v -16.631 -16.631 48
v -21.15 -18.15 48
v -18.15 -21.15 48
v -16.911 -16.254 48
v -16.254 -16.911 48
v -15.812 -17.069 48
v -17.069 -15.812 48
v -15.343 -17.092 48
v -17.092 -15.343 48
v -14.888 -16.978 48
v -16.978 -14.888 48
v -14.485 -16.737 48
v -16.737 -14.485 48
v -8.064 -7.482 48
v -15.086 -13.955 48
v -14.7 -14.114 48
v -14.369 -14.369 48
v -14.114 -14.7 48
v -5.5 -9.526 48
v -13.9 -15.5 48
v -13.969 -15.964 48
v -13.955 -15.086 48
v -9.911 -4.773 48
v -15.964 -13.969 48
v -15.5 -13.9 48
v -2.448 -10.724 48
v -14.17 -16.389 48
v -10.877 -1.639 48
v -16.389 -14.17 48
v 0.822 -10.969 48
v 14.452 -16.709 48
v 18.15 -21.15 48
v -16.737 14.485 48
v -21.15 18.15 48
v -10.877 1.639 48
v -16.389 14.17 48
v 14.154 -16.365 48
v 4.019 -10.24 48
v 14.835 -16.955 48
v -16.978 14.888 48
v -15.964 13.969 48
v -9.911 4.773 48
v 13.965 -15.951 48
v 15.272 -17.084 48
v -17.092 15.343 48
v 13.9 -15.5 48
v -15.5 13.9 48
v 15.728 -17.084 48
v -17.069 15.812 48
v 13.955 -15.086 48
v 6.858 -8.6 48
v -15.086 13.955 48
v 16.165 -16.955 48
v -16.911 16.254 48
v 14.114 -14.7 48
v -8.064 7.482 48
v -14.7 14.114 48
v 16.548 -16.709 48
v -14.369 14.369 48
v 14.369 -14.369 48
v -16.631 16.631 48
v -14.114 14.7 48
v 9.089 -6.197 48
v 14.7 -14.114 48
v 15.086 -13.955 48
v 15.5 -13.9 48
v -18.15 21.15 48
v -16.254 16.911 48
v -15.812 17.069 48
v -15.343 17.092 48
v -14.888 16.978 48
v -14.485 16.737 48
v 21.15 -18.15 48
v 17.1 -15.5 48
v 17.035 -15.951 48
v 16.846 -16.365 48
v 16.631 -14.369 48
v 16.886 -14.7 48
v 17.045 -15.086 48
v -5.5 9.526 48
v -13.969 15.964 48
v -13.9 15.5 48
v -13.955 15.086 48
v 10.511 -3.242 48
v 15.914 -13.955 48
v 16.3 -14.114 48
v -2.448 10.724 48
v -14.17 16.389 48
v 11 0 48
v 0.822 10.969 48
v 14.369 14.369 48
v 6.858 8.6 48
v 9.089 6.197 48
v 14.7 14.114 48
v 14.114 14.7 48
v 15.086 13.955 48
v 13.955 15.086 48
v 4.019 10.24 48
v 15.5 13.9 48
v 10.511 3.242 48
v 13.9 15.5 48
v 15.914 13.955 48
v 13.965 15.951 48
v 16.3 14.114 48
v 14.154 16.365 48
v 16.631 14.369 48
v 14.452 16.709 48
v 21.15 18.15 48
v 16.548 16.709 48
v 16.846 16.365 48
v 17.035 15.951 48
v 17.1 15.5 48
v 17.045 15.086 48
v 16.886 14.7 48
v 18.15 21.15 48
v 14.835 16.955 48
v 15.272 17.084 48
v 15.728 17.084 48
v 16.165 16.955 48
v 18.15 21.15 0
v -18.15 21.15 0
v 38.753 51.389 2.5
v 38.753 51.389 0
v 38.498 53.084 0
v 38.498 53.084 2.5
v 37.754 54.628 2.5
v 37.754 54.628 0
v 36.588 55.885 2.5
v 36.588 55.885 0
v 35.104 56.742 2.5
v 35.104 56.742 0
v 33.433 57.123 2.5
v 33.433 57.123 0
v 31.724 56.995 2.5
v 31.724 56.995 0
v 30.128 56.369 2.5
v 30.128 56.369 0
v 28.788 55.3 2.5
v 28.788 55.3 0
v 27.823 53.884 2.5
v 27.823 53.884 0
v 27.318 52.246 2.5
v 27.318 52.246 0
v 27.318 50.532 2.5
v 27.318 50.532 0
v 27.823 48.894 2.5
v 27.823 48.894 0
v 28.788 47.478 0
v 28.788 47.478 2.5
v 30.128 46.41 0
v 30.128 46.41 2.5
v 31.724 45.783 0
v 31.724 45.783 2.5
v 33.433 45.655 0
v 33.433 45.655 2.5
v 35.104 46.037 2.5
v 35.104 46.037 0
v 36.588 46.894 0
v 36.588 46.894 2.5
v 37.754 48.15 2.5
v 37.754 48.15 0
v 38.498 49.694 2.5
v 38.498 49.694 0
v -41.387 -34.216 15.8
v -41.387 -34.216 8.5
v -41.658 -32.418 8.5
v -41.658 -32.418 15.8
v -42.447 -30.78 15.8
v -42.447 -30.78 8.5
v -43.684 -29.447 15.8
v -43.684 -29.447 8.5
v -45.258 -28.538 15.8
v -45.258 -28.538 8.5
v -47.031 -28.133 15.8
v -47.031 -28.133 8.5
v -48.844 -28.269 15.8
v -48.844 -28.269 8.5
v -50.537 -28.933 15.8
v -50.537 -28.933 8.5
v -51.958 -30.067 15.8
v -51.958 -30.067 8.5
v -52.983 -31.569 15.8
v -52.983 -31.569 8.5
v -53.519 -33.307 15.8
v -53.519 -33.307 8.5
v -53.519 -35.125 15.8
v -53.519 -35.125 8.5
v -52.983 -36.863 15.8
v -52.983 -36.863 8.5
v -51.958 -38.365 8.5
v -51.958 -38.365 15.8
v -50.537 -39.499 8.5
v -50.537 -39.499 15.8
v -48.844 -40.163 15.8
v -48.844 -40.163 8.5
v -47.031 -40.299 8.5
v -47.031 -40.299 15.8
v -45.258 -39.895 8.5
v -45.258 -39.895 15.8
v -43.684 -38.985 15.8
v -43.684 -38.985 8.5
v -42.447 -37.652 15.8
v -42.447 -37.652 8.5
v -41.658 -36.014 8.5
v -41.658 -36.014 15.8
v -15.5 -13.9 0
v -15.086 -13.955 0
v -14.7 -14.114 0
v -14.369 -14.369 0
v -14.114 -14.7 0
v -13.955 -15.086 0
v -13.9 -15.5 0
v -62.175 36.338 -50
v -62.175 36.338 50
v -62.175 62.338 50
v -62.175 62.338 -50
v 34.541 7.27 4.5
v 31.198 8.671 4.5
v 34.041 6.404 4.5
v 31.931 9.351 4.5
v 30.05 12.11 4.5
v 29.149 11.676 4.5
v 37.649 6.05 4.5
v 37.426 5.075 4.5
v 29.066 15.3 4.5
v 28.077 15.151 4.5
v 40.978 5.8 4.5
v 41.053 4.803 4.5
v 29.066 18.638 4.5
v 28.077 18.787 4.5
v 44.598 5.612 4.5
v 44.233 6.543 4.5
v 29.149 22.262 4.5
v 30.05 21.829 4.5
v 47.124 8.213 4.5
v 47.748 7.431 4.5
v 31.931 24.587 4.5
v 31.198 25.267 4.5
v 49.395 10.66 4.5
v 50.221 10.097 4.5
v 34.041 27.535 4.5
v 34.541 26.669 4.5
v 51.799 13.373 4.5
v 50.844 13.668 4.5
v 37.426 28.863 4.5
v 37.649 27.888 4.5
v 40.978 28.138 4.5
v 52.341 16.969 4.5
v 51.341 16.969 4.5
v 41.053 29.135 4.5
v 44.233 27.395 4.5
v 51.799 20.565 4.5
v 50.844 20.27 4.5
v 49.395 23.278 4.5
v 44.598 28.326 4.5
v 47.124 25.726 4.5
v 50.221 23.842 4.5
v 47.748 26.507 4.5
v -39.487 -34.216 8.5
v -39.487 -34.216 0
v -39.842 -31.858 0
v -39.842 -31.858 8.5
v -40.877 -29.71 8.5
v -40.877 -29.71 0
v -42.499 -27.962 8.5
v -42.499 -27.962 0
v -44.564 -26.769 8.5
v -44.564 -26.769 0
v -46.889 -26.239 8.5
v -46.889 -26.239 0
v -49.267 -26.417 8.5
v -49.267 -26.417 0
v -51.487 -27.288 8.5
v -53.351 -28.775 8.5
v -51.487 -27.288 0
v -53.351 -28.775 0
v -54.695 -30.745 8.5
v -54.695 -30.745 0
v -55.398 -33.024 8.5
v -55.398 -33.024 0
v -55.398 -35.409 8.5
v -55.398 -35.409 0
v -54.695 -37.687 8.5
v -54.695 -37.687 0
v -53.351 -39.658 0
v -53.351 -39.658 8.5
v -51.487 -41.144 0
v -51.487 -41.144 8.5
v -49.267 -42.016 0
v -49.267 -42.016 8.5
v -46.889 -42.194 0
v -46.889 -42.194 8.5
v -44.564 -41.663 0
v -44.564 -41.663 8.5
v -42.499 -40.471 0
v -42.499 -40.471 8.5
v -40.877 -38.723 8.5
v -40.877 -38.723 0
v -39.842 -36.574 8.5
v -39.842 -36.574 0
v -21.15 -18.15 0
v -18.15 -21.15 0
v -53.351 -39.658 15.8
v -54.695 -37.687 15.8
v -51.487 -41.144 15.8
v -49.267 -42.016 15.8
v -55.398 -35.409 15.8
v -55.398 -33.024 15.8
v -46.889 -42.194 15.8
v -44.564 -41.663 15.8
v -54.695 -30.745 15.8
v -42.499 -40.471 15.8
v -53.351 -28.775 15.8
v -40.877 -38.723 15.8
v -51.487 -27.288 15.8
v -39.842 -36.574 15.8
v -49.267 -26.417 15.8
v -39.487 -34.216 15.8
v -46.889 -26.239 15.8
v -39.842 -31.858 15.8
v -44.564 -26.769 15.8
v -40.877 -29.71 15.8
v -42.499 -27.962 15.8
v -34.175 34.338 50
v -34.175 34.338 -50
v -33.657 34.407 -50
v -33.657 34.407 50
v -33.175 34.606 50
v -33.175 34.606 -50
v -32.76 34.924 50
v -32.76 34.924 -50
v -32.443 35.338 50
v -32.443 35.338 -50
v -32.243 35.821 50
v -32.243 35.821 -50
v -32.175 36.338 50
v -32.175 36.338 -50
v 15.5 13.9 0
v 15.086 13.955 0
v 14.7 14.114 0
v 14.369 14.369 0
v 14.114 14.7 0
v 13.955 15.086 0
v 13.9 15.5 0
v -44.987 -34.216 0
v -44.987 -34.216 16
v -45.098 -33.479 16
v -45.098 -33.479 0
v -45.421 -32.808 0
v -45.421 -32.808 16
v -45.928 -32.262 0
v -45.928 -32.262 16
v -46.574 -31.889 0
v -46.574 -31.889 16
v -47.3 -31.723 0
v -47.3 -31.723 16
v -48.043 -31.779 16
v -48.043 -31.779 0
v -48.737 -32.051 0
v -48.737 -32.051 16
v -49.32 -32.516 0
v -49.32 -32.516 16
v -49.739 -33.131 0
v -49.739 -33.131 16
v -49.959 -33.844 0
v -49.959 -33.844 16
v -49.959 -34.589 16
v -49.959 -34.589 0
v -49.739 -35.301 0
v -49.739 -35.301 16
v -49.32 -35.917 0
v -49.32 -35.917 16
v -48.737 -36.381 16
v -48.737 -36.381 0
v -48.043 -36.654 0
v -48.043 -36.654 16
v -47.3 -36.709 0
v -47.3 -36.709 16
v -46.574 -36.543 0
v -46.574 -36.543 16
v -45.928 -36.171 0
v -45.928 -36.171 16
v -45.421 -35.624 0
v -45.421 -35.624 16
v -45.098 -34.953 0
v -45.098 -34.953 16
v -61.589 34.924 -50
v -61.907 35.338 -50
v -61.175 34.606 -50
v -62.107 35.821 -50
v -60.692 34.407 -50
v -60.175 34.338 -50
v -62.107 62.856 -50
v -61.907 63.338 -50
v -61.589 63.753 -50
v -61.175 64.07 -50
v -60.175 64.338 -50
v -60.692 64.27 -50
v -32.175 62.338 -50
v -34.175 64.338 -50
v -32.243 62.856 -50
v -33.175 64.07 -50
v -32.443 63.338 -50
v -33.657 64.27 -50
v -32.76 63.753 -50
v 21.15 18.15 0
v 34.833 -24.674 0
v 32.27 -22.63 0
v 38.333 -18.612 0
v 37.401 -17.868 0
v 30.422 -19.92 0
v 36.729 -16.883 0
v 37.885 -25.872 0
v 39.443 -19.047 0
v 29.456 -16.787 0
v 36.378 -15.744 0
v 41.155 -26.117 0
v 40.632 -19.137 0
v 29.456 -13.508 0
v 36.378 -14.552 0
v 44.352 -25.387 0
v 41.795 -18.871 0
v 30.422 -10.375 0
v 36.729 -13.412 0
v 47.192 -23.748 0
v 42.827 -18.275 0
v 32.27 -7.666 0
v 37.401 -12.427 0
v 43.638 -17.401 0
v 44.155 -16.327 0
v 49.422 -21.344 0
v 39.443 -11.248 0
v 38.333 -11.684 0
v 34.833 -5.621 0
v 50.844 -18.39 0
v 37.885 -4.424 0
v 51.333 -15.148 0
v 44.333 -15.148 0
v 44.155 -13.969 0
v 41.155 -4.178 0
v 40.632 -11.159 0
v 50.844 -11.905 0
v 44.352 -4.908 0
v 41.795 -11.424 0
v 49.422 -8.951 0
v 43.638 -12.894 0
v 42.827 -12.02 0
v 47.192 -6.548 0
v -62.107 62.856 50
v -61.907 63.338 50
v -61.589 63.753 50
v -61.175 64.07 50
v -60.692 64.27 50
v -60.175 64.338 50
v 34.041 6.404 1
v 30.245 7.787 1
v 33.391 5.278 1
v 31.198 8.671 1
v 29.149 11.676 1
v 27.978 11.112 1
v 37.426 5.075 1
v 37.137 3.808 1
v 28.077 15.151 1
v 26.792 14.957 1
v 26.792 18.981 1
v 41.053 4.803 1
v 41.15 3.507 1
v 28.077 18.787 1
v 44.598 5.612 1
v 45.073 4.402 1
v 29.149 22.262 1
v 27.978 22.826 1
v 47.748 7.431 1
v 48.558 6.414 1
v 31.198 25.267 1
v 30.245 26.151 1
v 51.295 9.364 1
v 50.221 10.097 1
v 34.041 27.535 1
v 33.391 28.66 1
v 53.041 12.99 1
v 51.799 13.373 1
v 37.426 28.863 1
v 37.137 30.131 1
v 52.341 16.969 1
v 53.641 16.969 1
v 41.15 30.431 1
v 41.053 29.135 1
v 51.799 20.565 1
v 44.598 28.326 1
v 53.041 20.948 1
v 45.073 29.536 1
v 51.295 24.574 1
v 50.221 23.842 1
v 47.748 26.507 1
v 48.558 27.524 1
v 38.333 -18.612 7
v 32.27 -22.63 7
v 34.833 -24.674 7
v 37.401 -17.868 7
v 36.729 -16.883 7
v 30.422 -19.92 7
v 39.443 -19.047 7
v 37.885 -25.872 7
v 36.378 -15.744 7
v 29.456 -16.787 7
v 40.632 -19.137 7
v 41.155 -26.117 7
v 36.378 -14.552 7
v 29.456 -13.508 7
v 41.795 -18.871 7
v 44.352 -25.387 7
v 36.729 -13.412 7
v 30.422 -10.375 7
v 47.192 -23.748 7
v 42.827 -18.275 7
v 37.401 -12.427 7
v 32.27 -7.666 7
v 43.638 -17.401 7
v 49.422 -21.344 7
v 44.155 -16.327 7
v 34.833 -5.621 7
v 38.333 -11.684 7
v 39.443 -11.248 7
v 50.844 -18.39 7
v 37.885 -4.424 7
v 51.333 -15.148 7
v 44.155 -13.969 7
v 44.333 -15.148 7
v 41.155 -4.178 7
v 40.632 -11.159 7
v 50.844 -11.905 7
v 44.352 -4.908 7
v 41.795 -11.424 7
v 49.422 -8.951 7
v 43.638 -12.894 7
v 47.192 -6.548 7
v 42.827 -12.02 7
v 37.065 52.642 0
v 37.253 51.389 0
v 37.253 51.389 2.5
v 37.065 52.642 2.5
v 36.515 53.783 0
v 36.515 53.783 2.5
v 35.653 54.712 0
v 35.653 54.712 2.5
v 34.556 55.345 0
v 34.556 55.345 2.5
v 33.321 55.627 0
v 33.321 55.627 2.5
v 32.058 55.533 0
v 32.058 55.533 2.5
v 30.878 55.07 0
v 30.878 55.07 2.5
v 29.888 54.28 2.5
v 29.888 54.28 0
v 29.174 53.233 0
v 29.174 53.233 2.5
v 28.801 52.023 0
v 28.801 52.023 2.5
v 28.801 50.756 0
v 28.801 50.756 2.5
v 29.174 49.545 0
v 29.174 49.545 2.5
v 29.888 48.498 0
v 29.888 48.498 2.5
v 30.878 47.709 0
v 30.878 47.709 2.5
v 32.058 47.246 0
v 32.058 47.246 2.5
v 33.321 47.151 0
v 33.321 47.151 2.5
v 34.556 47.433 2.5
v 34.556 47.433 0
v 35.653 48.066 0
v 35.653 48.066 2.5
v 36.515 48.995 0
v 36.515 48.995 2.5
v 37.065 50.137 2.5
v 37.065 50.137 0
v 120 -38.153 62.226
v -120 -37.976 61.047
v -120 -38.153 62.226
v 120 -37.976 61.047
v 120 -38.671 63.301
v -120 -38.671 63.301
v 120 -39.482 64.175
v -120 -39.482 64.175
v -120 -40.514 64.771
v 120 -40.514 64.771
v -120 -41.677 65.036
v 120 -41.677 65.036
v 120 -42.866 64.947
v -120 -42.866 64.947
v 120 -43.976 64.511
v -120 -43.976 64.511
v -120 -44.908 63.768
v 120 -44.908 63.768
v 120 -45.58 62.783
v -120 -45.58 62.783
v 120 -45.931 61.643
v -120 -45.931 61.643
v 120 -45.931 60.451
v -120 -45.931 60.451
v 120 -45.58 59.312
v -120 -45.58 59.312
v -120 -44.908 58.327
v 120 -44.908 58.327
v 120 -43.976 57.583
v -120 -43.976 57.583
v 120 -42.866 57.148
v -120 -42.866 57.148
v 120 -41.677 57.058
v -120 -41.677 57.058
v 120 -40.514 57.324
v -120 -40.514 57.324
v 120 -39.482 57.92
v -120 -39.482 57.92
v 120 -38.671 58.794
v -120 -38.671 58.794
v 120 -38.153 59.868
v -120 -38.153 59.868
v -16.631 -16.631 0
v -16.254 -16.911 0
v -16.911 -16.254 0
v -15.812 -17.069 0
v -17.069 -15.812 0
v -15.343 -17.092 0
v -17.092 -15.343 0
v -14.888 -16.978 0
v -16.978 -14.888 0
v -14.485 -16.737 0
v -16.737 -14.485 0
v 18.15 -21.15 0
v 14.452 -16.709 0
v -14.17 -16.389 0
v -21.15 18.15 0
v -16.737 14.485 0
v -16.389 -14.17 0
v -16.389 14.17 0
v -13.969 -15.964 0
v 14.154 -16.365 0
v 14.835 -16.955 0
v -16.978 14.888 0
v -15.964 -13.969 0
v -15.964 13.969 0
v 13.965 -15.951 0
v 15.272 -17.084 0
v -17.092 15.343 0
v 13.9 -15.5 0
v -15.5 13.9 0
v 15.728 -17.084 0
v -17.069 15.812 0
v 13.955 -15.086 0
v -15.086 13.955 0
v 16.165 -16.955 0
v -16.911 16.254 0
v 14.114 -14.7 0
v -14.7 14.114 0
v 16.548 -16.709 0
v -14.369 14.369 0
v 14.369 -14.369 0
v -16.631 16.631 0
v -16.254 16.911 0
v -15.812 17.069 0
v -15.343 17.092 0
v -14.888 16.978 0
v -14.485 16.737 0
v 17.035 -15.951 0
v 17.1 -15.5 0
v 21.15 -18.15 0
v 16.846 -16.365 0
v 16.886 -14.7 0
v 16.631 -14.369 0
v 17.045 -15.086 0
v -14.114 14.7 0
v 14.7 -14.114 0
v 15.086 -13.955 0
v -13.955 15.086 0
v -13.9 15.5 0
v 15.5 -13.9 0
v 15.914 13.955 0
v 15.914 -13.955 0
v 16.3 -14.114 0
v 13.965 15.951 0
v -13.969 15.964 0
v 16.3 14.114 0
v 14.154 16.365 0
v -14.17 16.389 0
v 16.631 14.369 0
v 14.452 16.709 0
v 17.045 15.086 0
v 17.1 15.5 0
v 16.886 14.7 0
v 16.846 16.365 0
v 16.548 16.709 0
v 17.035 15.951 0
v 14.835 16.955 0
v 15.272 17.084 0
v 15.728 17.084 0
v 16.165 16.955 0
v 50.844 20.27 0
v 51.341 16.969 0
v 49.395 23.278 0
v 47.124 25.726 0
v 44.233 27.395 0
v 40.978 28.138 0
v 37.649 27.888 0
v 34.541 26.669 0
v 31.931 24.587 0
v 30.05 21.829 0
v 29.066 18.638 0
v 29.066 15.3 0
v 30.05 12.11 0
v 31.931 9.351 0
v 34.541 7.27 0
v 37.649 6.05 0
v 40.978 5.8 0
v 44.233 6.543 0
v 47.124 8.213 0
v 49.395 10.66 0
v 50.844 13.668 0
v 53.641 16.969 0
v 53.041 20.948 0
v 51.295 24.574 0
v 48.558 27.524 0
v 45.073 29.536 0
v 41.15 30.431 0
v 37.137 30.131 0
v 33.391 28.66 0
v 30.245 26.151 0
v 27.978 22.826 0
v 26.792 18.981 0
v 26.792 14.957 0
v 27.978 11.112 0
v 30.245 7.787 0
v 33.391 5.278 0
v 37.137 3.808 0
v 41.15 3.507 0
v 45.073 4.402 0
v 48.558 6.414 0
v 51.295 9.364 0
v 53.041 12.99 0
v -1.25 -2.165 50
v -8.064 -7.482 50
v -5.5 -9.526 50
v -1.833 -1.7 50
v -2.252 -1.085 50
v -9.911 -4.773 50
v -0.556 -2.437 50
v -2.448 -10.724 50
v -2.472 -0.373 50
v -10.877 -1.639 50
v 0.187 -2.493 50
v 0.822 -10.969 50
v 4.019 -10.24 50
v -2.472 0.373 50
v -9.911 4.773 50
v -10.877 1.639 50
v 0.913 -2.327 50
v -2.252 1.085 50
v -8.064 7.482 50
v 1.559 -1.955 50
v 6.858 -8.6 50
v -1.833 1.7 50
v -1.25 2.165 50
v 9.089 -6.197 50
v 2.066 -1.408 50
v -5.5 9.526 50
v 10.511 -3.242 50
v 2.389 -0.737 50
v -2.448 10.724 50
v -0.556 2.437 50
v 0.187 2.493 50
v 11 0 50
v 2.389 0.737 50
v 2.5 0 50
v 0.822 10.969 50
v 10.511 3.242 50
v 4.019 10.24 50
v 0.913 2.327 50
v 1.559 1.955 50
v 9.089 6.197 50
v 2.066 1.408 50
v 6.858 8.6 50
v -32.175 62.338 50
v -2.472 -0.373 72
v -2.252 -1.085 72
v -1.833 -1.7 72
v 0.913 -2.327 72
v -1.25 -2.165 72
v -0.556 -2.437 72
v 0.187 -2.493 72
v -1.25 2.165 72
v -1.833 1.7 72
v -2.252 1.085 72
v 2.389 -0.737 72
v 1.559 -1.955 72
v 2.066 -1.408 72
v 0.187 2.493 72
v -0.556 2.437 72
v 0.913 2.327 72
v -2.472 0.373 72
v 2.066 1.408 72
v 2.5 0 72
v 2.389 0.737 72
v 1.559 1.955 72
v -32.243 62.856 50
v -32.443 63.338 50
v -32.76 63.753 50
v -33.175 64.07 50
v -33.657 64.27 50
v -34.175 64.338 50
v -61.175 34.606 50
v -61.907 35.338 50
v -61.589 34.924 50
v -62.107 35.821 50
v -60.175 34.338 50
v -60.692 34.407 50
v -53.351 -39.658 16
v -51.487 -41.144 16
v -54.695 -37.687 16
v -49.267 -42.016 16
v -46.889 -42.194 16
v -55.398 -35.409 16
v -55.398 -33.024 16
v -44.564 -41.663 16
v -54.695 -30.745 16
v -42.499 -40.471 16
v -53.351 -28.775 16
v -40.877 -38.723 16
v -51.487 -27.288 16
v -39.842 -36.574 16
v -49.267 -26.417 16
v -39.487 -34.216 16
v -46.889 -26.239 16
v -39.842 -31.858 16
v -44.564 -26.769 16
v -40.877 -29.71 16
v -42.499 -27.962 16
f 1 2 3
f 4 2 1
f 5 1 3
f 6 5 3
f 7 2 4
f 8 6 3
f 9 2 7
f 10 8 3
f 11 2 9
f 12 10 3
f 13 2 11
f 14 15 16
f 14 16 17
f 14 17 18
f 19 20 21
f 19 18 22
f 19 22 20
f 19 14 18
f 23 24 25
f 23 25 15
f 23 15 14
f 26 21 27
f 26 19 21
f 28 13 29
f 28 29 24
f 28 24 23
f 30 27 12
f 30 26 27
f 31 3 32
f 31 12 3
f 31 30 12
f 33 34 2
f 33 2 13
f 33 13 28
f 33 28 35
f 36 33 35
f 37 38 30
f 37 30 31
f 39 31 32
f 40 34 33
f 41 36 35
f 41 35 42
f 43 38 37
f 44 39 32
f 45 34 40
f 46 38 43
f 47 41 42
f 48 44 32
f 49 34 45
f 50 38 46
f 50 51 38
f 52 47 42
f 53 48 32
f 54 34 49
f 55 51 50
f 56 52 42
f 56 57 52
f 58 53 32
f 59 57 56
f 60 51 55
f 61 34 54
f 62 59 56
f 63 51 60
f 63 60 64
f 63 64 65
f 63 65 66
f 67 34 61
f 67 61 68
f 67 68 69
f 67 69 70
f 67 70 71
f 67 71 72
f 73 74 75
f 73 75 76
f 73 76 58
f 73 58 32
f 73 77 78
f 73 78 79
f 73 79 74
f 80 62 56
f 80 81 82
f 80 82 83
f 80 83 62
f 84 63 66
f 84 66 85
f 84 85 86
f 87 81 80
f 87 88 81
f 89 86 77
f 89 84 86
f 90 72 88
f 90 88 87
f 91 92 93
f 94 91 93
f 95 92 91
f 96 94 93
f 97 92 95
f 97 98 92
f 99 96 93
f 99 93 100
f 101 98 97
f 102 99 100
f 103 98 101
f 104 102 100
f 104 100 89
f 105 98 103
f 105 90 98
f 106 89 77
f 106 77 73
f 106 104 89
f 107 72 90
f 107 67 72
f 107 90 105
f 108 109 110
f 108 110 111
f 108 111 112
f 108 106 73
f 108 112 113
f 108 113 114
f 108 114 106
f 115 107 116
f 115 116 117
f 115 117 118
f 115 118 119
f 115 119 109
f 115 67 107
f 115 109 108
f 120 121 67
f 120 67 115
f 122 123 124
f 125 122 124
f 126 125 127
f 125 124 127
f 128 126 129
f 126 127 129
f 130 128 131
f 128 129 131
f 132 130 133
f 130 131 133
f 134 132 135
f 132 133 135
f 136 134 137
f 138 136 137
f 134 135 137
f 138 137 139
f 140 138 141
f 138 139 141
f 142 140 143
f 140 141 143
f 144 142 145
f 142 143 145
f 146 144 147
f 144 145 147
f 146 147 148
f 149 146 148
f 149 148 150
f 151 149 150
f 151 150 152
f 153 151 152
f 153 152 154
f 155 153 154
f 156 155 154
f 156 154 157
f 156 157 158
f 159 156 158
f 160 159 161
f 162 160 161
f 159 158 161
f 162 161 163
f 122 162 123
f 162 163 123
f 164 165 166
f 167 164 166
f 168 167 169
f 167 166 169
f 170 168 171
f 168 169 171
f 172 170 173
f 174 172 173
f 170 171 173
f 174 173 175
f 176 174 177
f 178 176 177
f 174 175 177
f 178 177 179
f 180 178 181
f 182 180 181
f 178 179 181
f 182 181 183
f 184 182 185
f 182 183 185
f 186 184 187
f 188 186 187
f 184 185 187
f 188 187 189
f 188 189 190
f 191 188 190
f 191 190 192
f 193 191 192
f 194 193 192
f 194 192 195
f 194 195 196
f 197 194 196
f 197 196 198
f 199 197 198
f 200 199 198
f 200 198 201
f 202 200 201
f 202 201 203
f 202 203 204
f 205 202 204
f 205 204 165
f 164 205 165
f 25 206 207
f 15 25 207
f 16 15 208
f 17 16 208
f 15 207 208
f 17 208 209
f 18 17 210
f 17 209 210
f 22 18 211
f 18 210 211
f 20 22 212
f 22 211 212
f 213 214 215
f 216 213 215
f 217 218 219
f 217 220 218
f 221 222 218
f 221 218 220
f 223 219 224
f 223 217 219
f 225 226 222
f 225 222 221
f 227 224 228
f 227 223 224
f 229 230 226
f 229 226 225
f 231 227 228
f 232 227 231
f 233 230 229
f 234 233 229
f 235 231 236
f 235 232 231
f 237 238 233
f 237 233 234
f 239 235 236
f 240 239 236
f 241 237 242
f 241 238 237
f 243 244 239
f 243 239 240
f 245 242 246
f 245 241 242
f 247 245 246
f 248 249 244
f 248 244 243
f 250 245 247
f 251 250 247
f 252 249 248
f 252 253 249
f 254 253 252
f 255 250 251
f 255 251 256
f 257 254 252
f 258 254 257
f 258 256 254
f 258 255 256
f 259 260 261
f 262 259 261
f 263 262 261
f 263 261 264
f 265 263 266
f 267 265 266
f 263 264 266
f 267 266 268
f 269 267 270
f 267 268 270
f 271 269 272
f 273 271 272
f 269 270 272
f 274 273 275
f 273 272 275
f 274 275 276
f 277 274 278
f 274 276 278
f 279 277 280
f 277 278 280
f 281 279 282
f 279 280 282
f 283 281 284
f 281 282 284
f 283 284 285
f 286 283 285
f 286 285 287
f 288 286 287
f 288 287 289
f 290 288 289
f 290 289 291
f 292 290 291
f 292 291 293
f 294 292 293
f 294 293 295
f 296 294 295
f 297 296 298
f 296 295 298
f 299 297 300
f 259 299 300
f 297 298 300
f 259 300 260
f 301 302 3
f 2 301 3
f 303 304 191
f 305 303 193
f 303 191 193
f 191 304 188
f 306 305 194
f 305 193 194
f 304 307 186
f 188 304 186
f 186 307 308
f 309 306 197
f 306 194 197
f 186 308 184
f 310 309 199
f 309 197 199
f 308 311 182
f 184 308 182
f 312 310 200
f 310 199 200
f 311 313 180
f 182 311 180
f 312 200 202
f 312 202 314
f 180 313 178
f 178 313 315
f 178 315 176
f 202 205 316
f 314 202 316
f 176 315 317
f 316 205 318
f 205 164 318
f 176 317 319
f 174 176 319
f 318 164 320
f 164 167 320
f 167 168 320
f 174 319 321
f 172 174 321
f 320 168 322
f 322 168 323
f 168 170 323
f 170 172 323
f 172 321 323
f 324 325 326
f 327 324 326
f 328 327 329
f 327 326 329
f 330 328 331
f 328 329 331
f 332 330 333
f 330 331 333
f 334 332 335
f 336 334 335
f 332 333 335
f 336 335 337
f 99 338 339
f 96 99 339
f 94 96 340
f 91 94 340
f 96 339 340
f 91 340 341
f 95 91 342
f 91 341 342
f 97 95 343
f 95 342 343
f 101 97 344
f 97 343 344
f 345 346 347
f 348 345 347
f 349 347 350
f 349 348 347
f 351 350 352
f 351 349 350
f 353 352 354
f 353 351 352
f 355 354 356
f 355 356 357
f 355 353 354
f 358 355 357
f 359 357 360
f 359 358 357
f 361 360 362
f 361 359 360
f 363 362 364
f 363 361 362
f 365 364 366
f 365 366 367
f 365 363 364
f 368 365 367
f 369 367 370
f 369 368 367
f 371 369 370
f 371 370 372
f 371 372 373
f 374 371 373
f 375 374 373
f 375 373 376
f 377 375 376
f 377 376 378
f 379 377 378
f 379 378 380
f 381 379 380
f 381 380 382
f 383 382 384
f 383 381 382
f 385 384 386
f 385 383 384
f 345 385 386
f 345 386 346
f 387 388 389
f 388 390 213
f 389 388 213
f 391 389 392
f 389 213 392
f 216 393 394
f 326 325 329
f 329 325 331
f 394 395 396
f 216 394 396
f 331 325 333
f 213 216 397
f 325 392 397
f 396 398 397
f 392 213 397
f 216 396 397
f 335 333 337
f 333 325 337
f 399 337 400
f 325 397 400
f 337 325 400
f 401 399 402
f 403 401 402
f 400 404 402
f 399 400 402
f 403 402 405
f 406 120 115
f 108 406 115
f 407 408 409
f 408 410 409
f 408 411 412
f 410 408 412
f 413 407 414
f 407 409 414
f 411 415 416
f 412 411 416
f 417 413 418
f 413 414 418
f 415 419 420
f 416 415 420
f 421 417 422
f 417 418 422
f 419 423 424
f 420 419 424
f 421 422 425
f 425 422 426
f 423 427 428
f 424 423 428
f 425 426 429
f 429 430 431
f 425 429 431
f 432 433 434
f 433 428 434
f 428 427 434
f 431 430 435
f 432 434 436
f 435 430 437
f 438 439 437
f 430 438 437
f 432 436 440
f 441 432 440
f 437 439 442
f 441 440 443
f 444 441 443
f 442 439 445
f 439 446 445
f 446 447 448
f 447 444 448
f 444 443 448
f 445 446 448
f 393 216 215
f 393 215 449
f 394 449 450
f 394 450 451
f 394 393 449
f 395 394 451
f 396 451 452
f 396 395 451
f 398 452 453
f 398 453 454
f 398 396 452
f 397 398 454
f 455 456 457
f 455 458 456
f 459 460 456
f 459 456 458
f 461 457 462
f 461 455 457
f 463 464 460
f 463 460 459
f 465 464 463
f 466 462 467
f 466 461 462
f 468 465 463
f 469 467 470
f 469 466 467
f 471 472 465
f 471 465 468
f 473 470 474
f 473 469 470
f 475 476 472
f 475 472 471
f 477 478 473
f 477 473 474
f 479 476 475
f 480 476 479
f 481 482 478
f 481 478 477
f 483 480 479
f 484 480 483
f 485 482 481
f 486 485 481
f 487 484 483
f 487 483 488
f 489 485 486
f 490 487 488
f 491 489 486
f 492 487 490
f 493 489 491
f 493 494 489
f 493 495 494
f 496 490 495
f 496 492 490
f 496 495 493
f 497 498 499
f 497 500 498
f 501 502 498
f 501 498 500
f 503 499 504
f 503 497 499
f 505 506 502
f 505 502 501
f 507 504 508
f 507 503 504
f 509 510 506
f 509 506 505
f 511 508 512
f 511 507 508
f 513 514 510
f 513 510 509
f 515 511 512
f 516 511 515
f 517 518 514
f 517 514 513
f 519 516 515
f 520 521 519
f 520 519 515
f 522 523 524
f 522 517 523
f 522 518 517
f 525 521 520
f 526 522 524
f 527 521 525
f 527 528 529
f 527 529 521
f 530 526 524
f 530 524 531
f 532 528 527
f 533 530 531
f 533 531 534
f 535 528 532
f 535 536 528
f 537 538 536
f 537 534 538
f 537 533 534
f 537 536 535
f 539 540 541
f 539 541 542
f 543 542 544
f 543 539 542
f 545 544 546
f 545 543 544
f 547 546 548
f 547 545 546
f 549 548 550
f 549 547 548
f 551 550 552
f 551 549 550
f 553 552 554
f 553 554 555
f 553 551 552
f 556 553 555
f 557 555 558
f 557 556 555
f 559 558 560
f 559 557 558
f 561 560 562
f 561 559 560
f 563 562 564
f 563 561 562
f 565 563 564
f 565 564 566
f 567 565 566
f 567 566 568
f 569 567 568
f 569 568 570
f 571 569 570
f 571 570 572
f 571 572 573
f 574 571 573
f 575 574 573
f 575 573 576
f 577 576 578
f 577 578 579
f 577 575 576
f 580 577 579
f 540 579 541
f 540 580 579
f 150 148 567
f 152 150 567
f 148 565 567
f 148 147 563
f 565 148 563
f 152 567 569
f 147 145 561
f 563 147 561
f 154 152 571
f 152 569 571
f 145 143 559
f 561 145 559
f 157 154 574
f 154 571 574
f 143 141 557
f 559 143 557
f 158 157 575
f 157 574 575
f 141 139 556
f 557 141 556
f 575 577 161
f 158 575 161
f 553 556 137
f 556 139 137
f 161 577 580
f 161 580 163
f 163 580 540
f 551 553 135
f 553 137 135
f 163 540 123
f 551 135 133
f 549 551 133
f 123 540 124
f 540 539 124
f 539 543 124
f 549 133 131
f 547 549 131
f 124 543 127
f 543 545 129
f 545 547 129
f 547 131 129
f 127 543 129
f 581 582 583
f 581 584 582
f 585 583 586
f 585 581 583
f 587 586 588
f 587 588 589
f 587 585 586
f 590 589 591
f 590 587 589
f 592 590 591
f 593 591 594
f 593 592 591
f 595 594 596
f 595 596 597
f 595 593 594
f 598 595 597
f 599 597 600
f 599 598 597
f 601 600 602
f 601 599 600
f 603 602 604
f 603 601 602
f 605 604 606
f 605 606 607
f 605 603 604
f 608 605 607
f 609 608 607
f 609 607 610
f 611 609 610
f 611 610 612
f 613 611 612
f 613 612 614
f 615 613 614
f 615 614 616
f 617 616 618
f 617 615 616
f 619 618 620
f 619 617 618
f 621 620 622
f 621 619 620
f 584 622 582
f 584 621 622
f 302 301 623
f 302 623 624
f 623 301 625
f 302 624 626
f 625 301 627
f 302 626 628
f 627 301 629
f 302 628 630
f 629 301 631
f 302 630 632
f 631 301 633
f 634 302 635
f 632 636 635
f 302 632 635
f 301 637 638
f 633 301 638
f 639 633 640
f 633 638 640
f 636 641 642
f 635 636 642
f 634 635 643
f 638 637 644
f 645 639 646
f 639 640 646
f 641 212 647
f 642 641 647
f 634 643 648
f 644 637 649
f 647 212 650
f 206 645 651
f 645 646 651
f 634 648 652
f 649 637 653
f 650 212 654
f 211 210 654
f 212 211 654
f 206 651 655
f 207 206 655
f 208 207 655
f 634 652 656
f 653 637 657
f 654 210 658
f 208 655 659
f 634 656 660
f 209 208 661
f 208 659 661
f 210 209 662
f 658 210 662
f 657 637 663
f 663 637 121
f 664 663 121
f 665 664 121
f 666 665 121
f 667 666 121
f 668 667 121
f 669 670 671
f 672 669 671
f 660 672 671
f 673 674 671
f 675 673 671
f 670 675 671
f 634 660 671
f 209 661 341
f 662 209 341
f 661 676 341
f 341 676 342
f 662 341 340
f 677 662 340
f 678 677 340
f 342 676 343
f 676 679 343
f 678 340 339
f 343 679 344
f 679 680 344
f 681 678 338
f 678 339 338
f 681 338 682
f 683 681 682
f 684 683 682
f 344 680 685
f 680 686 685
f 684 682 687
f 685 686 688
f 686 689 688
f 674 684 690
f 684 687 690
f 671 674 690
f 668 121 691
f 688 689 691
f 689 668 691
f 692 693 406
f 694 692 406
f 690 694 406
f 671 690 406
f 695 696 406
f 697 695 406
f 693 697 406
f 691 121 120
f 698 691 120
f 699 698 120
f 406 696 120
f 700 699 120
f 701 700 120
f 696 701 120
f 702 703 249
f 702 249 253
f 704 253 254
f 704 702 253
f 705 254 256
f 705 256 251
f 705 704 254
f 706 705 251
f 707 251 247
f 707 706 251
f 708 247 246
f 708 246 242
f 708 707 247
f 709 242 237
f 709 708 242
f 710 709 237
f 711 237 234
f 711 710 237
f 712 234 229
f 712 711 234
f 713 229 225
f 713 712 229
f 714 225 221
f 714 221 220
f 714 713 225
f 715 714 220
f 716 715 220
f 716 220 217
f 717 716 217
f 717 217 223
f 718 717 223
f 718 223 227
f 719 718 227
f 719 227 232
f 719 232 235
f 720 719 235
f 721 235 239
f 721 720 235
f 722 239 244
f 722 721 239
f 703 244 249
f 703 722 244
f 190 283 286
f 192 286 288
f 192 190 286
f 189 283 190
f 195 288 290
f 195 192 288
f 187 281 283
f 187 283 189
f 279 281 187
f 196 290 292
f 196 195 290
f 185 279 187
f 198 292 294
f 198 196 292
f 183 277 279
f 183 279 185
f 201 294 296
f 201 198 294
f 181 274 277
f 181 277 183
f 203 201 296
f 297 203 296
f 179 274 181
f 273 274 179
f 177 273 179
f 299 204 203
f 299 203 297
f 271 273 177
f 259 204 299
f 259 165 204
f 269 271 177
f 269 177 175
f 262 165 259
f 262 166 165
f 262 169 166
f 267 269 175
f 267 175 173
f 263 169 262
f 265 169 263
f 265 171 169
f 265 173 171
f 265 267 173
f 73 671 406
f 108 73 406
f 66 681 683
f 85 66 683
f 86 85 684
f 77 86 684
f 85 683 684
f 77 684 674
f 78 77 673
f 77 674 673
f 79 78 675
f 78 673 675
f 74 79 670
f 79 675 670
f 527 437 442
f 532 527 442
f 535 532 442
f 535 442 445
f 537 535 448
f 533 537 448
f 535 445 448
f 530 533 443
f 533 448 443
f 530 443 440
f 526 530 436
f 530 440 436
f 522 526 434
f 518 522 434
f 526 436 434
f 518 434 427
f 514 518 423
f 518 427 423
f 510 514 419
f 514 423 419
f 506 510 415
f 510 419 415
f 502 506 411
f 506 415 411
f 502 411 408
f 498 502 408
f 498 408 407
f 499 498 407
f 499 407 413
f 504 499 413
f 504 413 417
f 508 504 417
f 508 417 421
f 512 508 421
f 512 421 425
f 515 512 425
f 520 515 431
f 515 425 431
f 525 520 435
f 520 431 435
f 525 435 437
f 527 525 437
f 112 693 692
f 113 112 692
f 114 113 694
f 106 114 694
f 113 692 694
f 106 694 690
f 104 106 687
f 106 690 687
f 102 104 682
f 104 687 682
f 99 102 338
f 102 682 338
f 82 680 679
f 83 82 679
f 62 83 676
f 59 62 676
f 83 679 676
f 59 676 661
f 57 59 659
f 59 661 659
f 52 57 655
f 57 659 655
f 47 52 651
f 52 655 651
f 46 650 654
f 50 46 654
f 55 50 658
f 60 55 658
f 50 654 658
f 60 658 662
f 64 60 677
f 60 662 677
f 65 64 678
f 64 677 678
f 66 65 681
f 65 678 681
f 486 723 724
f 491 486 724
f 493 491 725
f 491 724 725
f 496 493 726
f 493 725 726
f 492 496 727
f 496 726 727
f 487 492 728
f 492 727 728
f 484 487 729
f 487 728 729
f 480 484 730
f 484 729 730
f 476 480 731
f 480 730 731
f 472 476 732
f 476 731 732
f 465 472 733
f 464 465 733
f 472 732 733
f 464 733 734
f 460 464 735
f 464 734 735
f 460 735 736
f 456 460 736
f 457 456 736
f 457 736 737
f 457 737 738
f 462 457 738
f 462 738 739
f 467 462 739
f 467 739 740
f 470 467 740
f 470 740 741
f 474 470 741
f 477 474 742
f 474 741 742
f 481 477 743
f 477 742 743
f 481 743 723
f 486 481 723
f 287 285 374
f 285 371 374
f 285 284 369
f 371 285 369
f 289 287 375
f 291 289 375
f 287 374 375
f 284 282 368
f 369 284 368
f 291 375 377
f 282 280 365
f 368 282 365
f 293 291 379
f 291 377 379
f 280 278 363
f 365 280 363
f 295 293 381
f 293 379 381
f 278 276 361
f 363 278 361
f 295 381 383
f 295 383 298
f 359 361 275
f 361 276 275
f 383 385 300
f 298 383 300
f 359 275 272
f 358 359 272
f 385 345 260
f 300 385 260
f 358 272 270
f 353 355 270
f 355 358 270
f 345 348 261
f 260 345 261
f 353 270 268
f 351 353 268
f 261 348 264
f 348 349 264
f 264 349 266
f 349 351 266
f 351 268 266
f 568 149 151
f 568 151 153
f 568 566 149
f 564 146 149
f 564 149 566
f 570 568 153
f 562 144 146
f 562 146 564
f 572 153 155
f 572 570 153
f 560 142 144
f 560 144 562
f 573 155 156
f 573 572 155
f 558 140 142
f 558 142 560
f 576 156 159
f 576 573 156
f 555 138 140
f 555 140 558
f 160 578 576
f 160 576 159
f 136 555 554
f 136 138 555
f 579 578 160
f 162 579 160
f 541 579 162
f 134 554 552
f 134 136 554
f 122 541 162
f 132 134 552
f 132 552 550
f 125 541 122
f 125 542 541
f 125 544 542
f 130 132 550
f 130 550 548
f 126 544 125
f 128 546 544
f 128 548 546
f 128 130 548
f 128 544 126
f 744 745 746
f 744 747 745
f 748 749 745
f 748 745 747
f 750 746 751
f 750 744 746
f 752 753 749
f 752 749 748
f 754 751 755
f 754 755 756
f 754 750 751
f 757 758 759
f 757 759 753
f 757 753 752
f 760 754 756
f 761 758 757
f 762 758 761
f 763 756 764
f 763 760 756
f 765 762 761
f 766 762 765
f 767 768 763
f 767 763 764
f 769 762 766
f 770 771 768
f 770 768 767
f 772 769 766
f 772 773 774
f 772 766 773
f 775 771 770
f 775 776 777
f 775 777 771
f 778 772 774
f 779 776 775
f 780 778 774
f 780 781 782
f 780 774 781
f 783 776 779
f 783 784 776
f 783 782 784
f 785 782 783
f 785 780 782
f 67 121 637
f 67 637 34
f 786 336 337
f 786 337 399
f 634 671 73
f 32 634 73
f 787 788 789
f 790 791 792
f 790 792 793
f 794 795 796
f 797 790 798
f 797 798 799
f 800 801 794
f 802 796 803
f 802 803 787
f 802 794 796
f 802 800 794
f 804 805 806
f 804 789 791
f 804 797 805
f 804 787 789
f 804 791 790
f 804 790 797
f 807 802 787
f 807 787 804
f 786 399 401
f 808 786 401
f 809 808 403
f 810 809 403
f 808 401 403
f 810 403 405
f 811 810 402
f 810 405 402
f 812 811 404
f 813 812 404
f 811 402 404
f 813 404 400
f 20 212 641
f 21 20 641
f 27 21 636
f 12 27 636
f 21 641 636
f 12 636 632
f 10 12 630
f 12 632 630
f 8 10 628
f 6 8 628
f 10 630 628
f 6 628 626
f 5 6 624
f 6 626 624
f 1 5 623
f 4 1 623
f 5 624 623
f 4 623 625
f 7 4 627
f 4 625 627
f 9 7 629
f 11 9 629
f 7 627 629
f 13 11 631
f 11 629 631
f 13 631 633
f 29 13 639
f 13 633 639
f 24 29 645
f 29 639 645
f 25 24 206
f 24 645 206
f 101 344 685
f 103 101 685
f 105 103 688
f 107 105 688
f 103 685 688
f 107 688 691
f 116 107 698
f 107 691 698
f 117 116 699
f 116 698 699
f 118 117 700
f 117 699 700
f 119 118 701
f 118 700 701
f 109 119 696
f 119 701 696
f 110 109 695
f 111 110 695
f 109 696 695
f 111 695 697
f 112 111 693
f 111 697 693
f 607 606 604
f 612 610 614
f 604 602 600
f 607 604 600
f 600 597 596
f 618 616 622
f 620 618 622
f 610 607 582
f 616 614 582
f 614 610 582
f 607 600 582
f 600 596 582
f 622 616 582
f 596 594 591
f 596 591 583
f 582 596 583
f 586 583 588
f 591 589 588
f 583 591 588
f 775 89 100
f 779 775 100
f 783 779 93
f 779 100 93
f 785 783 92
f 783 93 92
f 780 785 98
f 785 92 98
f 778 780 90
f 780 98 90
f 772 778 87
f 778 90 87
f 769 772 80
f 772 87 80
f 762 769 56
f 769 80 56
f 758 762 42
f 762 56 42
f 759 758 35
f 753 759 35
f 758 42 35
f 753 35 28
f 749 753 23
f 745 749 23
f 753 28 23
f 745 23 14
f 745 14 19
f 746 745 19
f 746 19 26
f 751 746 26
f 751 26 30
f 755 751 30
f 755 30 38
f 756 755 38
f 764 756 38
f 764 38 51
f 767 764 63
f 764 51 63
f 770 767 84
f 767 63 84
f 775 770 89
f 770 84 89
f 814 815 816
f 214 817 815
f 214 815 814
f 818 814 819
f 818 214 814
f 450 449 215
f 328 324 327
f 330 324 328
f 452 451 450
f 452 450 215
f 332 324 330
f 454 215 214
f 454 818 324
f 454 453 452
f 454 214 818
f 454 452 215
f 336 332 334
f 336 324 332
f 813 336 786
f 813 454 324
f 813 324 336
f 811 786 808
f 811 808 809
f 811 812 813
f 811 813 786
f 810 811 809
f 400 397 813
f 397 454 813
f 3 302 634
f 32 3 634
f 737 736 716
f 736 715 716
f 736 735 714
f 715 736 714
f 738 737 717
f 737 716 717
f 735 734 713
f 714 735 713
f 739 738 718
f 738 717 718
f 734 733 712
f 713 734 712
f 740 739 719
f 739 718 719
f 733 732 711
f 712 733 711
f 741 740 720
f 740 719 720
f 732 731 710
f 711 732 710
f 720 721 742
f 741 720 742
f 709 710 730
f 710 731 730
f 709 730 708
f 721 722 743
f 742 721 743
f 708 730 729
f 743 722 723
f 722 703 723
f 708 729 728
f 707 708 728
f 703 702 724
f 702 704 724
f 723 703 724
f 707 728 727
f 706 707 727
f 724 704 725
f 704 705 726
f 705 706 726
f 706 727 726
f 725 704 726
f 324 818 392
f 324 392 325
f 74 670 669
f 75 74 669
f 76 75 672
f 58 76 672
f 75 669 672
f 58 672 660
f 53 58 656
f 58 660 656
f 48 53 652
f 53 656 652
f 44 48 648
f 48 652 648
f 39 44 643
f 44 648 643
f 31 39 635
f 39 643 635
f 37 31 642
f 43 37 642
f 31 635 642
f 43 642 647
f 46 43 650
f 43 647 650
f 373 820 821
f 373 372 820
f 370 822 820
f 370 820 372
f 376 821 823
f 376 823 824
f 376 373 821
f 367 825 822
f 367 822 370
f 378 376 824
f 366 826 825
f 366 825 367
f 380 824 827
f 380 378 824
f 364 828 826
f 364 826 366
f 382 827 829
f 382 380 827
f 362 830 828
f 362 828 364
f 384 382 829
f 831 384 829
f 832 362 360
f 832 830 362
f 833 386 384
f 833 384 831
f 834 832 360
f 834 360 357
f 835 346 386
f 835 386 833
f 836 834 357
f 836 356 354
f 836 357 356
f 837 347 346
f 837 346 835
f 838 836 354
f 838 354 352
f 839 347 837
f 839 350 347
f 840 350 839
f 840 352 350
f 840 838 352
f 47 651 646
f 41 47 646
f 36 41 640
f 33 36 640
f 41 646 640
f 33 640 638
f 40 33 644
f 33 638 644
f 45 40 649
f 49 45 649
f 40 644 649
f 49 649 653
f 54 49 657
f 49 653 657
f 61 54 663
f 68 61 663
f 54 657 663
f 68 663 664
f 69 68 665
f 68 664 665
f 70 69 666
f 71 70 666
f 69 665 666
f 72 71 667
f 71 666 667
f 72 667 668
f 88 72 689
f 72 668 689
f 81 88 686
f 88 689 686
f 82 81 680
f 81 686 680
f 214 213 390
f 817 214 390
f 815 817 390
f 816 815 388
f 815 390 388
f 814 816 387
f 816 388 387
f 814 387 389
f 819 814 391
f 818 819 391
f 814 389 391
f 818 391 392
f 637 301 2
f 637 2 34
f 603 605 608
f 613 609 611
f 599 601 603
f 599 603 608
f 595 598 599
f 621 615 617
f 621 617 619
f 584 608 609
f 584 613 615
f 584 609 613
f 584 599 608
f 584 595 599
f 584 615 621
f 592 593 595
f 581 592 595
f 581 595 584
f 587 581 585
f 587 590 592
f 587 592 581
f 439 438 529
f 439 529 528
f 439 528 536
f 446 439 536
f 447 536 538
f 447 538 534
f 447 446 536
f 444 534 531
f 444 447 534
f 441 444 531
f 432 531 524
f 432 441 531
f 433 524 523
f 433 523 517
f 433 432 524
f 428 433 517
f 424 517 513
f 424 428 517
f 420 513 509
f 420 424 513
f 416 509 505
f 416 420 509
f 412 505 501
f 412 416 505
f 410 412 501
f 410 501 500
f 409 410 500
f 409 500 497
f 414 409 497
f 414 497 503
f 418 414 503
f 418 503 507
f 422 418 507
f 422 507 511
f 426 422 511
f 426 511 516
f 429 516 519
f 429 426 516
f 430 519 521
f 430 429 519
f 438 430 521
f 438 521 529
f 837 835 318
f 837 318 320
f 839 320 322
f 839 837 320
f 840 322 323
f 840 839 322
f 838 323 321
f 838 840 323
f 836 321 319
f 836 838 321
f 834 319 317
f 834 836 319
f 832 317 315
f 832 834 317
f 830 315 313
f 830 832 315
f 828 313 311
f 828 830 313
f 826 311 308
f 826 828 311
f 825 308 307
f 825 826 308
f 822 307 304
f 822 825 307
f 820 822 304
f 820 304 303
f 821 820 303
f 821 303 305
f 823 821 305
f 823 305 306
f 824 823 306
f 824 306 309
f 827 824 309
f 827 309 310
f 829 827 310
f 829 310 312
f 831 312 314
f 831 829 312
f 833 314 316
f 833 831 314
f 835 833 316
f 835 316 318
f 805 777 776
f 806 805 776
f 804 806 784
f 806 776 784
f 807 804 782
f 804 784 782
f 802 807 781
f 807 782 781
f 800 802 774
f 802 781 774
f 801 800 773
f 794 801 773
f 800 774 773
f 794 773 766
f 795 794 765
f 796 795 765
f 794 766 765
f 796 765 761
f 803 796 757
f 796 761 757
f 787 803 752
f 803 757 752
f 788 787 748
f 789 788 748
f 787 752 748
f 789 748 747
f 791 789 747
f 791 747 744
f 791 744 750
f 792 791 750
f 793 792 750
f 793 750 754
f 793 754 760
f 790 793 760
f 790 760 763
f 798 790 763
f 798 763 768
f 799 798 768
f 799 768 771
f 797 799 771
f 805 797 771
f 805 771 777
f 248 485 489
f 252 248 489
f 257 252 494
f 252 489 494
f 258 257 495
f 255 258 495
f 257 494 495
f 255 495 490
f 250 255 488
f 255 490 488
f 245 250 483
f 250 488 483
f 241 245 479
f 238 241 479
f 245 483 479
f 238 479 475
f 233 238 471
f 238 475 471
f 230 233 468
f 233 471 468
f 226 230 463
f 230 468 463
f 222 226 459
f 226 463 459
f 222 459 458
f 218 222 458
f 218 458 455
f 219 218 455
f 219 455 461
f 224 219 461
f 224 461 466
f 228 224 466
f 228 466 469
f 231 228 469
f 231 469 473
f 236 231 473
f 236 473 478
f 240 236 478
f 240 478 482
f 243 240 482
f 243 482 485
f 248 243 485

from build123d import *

# Parameters (mm, degrees)
F0_W      = 42.3
F0_H      = 42.3
F1_DEPTH  = 48
F2_SIZE   = 3
F3_R      = 11
F3_R_2    = 2.5
F4_DEPTH  = 2
F5_DEPTH  = 24
F6_R      = 6.1
F6_R_2    = 2.5
F7_DEPTH  = 16
F6_R_3    = 8
F8_DEPTH  = 8.5
F9_R      = 8
F9_R_2    = 6.1
F10_DEPTH = 0.2
F11_R     = 13.5
F11_R_2   = 12.2
F12_DEPTH = 1
F11_R_3   = 11.2
F13_DEPTH = 4.5
F14_R     = 11
F14_R_2   = 4
F15_DEPTH = 7
F16_R     = 5.75
F16_R_2   = 4.25
F17_DEPTH = 2.5
F18_R     = 4
F19_DEPTH = 120
F21_W     = 30
F21_H     = 30
F22_DEPTH = 50
F23_R     = 2


with BuildPart() as f1:
    # F0 (on Top) → F1 (new body)
    with BuildSketch(Plane.XY):
        Rectangle(F0_W, F0_H)
        with BuildLine():
            ThreePointArc((-15.5, 13.9), (-16.6313708499, 16.6313708499), (-13.9, 15.5))
            Line((-13.9, 15.5), (13.9, 15.5))
            ThreePointArc((13.9, 15.5), (15.5, 17.1), (17.1, 15.5))
            ThreePointArc((17.1, 15.5), (16.6313708499, 14.3686291501), (15.5, 13.9))
            Line((15.5, 13.9), (15.5, -13.9))
            ThreePointArc((15.5, -13.9), (16.6313708499, -14.3686291501), (17.1, -15.5))
            ThreePointArc((17.1, -15.5), (15.5, -17.1), (13.9, -15.5))
            Line((13.9, -15.5), (-13.9, -15.5))
            ThreePointArc((-13.9, -15.5), (-16.6313708499, -16.6313708499), (-15.5, -13.9))
            Line((-15.5, -13.9), (-15.5, 13.9))
        make_face(mode=Mode.SUBTRACT)
        with BuildLine():
            Line((13.9, 15.5), (-13.9, 15.5))
            ThreePointArc((-13.9, 15.5), (-14.3686291501, 14.3686291501), (-15.5, 13.9))
            Line((-15.5, 13.9), (-15.5, -13.9))
            ThreePointArc((-15.5, -13.9), (-14.3686291501, -14.3686291501), (-13.9, -15.5))
            Line((-13.9, -15.5), (13.9, -15.5))
            ThreePointArc((13.9, -15.5), (14.3686291501, -14.3686291501), (15.5, -13.9))
            Line((15.5, -13.9), (15.5, 13.9))
            ThreePointArc((15.5, 13.9), (14.3686291501, 14.3686291501), (13.9, 15.5))
        make_face()
    extrude(amount=F1_DEPTH)

    # F2
    f2_edges = [f1.edges().sort_by_distance(p)[0] for p in [
        (-21.15, 21.15, 24),
        (-21.15, -21.15, 24),
        (21.15, 21.15, 24),
        (21.15, -21.15, 24),
    ]]
    chamfer(f2_edges, length=F2_SIZE)

    # F3 (on face) → F4 (join)
    with BuildSketch(Plane.XY.offset(48)):
        Circle(F3_R)
        Circle(F3_R_2, mode=Mode.SUBTRACT)
    extrude(amount=F4_DEPTH)

    # F5 (add): a face of the model
    f5_faces = [f1.faces().sort_by_distance(p)[0] for p in [
        (0, 0, 48),
    ]]
    extrude(f5_faces, amount=F5_DEPTH)


with BuildPart() as f7:
    # F6 (on Top) → F7 (new body)
    with BuildSketch(Plane.XY):
        with Locations((-47.4868752062, -34.2161878943)):
            Circle(F6_R)
        with Locations((-47.4868752062, -34.2161878943)):
            Circle(F6_R_2, mode=Mode.SUBTRACT)
    extrude(amount=F7_DEPTH)

    # F6 (on Top) → F8 (join)
    with BuildSketch(Plane.XY):
        with Locations((-47.4868752062, -34.2161878943)):
            Circle(F6_R_3)
        with Locations((-47.4868752062, -34.2161878943)):
            Circle(F6_R, mode=Mode.SUBTRACT)
    extrude(amount=F8_DEPTH)

    # F9 (on face) → F10 (join)
    with BuildSketch(Plane.XY.offset(16)):
        with Locations((-47.4868752062, -34.2161878943)):
            Circle(F9_R)
        with Locations((-47.4868752062, -34.2161878943)):
            Circle(F9_R_2, mode=Mode.SUBTRACT)
    extrude(amount=-F10_DEPTH)


with BuildPart() as f12:
    # F11 (on Top) → F12 (new body)
    with BuildSketch(Plane.XY):
        with Locations((40.1412062347, 16.9690605253)):
            Circle(F11_R)
        with Locations((40.1412062347, 16.9690605253)):
            Circle(F11_R_2, mode=Mode.SUBTRACT)
    extrude(amount=F12_DEPTH)

    # F11 (on Top) → F13 (join)
    with BuildSketch(Plane.XY):
        with Locations((40.1412062347, 16.9690605253)):
            Circle(F11_R_2)
        with Locations((40.1412062347, 16.9690605253)):
            Circle(F11_R_3, mode=Mode.SUBTRACT)
    extrude(amount=F13_DEPTH)


with BuildPart() as f15:
    # F14 (on Top) → F15 (new body)
    with BuildSketch(Plane.XY):
        with Locations((40.3331406415, -15.1477409527)):
            Circle(F14_R)
        with Locations((40.3331406415, -15.1477409527)):
            Circle(F14_R_2, mode=Mode.SUBTRACT)
    extrude(amount=F15_DEPTH)


with BuildPart() as f17:
    # F16 (on Top) → F17 (new body)
    with BuildSketch(Plane.XY):
        with Locations((33.0033525825, 51.3892285526)):
            Circle(F16_R)
        with Locations((33.0033525825, 51.3892285526)):
            Circle(F16_R_2, mode=Mode.SUBTRACT)
    extrude(amount=F17_DEPTH)


with BuildPart() as f19:
    # F18 (on Right) → F19 (new body)
    with BuildSketch(Plane.YZ):
        with Locations((-41.9756695628, 61.0472224653)):
            Circle(F18_R)
    extrude(amount=F19_DEPTH)

    # F20: F19 across plane


with BuildPart() as f19_1:
    add(f19.part)
    add(f19.part.mirror(Plane.YZ))


with BuildPart() as f22:
    # F21 (on Top) → F22 (new body)
    with BuildSketch(Plane.XY):
        with Locations((-47.1746884286, 49.33844237)):
            Rectangle(F21_W, F21_H)
    extrude(amount=F22_DEPTH)

    # F23
    f23_edges = [f22.edges().sort_by_distance(p)[0] for p in [
        (-62.174688, 64.338442, 25),
        (-62.174688, 34.338442, 25),
        (-32.174688, 64.338442, 25),
        (-32.174688, 34.338442, 25),
    ]]
    fillet(f23_edges, radius=F23_R)

    # F24: F22 across plane


with BuildPart() as f22_1:
    add(f22.part)
    add(f22.part.mirror(Plane.XY))


solid = Compound([f1.part, f7.part, f12.part, f15.part, f17.part, f19_1.part, f22_1.part])
